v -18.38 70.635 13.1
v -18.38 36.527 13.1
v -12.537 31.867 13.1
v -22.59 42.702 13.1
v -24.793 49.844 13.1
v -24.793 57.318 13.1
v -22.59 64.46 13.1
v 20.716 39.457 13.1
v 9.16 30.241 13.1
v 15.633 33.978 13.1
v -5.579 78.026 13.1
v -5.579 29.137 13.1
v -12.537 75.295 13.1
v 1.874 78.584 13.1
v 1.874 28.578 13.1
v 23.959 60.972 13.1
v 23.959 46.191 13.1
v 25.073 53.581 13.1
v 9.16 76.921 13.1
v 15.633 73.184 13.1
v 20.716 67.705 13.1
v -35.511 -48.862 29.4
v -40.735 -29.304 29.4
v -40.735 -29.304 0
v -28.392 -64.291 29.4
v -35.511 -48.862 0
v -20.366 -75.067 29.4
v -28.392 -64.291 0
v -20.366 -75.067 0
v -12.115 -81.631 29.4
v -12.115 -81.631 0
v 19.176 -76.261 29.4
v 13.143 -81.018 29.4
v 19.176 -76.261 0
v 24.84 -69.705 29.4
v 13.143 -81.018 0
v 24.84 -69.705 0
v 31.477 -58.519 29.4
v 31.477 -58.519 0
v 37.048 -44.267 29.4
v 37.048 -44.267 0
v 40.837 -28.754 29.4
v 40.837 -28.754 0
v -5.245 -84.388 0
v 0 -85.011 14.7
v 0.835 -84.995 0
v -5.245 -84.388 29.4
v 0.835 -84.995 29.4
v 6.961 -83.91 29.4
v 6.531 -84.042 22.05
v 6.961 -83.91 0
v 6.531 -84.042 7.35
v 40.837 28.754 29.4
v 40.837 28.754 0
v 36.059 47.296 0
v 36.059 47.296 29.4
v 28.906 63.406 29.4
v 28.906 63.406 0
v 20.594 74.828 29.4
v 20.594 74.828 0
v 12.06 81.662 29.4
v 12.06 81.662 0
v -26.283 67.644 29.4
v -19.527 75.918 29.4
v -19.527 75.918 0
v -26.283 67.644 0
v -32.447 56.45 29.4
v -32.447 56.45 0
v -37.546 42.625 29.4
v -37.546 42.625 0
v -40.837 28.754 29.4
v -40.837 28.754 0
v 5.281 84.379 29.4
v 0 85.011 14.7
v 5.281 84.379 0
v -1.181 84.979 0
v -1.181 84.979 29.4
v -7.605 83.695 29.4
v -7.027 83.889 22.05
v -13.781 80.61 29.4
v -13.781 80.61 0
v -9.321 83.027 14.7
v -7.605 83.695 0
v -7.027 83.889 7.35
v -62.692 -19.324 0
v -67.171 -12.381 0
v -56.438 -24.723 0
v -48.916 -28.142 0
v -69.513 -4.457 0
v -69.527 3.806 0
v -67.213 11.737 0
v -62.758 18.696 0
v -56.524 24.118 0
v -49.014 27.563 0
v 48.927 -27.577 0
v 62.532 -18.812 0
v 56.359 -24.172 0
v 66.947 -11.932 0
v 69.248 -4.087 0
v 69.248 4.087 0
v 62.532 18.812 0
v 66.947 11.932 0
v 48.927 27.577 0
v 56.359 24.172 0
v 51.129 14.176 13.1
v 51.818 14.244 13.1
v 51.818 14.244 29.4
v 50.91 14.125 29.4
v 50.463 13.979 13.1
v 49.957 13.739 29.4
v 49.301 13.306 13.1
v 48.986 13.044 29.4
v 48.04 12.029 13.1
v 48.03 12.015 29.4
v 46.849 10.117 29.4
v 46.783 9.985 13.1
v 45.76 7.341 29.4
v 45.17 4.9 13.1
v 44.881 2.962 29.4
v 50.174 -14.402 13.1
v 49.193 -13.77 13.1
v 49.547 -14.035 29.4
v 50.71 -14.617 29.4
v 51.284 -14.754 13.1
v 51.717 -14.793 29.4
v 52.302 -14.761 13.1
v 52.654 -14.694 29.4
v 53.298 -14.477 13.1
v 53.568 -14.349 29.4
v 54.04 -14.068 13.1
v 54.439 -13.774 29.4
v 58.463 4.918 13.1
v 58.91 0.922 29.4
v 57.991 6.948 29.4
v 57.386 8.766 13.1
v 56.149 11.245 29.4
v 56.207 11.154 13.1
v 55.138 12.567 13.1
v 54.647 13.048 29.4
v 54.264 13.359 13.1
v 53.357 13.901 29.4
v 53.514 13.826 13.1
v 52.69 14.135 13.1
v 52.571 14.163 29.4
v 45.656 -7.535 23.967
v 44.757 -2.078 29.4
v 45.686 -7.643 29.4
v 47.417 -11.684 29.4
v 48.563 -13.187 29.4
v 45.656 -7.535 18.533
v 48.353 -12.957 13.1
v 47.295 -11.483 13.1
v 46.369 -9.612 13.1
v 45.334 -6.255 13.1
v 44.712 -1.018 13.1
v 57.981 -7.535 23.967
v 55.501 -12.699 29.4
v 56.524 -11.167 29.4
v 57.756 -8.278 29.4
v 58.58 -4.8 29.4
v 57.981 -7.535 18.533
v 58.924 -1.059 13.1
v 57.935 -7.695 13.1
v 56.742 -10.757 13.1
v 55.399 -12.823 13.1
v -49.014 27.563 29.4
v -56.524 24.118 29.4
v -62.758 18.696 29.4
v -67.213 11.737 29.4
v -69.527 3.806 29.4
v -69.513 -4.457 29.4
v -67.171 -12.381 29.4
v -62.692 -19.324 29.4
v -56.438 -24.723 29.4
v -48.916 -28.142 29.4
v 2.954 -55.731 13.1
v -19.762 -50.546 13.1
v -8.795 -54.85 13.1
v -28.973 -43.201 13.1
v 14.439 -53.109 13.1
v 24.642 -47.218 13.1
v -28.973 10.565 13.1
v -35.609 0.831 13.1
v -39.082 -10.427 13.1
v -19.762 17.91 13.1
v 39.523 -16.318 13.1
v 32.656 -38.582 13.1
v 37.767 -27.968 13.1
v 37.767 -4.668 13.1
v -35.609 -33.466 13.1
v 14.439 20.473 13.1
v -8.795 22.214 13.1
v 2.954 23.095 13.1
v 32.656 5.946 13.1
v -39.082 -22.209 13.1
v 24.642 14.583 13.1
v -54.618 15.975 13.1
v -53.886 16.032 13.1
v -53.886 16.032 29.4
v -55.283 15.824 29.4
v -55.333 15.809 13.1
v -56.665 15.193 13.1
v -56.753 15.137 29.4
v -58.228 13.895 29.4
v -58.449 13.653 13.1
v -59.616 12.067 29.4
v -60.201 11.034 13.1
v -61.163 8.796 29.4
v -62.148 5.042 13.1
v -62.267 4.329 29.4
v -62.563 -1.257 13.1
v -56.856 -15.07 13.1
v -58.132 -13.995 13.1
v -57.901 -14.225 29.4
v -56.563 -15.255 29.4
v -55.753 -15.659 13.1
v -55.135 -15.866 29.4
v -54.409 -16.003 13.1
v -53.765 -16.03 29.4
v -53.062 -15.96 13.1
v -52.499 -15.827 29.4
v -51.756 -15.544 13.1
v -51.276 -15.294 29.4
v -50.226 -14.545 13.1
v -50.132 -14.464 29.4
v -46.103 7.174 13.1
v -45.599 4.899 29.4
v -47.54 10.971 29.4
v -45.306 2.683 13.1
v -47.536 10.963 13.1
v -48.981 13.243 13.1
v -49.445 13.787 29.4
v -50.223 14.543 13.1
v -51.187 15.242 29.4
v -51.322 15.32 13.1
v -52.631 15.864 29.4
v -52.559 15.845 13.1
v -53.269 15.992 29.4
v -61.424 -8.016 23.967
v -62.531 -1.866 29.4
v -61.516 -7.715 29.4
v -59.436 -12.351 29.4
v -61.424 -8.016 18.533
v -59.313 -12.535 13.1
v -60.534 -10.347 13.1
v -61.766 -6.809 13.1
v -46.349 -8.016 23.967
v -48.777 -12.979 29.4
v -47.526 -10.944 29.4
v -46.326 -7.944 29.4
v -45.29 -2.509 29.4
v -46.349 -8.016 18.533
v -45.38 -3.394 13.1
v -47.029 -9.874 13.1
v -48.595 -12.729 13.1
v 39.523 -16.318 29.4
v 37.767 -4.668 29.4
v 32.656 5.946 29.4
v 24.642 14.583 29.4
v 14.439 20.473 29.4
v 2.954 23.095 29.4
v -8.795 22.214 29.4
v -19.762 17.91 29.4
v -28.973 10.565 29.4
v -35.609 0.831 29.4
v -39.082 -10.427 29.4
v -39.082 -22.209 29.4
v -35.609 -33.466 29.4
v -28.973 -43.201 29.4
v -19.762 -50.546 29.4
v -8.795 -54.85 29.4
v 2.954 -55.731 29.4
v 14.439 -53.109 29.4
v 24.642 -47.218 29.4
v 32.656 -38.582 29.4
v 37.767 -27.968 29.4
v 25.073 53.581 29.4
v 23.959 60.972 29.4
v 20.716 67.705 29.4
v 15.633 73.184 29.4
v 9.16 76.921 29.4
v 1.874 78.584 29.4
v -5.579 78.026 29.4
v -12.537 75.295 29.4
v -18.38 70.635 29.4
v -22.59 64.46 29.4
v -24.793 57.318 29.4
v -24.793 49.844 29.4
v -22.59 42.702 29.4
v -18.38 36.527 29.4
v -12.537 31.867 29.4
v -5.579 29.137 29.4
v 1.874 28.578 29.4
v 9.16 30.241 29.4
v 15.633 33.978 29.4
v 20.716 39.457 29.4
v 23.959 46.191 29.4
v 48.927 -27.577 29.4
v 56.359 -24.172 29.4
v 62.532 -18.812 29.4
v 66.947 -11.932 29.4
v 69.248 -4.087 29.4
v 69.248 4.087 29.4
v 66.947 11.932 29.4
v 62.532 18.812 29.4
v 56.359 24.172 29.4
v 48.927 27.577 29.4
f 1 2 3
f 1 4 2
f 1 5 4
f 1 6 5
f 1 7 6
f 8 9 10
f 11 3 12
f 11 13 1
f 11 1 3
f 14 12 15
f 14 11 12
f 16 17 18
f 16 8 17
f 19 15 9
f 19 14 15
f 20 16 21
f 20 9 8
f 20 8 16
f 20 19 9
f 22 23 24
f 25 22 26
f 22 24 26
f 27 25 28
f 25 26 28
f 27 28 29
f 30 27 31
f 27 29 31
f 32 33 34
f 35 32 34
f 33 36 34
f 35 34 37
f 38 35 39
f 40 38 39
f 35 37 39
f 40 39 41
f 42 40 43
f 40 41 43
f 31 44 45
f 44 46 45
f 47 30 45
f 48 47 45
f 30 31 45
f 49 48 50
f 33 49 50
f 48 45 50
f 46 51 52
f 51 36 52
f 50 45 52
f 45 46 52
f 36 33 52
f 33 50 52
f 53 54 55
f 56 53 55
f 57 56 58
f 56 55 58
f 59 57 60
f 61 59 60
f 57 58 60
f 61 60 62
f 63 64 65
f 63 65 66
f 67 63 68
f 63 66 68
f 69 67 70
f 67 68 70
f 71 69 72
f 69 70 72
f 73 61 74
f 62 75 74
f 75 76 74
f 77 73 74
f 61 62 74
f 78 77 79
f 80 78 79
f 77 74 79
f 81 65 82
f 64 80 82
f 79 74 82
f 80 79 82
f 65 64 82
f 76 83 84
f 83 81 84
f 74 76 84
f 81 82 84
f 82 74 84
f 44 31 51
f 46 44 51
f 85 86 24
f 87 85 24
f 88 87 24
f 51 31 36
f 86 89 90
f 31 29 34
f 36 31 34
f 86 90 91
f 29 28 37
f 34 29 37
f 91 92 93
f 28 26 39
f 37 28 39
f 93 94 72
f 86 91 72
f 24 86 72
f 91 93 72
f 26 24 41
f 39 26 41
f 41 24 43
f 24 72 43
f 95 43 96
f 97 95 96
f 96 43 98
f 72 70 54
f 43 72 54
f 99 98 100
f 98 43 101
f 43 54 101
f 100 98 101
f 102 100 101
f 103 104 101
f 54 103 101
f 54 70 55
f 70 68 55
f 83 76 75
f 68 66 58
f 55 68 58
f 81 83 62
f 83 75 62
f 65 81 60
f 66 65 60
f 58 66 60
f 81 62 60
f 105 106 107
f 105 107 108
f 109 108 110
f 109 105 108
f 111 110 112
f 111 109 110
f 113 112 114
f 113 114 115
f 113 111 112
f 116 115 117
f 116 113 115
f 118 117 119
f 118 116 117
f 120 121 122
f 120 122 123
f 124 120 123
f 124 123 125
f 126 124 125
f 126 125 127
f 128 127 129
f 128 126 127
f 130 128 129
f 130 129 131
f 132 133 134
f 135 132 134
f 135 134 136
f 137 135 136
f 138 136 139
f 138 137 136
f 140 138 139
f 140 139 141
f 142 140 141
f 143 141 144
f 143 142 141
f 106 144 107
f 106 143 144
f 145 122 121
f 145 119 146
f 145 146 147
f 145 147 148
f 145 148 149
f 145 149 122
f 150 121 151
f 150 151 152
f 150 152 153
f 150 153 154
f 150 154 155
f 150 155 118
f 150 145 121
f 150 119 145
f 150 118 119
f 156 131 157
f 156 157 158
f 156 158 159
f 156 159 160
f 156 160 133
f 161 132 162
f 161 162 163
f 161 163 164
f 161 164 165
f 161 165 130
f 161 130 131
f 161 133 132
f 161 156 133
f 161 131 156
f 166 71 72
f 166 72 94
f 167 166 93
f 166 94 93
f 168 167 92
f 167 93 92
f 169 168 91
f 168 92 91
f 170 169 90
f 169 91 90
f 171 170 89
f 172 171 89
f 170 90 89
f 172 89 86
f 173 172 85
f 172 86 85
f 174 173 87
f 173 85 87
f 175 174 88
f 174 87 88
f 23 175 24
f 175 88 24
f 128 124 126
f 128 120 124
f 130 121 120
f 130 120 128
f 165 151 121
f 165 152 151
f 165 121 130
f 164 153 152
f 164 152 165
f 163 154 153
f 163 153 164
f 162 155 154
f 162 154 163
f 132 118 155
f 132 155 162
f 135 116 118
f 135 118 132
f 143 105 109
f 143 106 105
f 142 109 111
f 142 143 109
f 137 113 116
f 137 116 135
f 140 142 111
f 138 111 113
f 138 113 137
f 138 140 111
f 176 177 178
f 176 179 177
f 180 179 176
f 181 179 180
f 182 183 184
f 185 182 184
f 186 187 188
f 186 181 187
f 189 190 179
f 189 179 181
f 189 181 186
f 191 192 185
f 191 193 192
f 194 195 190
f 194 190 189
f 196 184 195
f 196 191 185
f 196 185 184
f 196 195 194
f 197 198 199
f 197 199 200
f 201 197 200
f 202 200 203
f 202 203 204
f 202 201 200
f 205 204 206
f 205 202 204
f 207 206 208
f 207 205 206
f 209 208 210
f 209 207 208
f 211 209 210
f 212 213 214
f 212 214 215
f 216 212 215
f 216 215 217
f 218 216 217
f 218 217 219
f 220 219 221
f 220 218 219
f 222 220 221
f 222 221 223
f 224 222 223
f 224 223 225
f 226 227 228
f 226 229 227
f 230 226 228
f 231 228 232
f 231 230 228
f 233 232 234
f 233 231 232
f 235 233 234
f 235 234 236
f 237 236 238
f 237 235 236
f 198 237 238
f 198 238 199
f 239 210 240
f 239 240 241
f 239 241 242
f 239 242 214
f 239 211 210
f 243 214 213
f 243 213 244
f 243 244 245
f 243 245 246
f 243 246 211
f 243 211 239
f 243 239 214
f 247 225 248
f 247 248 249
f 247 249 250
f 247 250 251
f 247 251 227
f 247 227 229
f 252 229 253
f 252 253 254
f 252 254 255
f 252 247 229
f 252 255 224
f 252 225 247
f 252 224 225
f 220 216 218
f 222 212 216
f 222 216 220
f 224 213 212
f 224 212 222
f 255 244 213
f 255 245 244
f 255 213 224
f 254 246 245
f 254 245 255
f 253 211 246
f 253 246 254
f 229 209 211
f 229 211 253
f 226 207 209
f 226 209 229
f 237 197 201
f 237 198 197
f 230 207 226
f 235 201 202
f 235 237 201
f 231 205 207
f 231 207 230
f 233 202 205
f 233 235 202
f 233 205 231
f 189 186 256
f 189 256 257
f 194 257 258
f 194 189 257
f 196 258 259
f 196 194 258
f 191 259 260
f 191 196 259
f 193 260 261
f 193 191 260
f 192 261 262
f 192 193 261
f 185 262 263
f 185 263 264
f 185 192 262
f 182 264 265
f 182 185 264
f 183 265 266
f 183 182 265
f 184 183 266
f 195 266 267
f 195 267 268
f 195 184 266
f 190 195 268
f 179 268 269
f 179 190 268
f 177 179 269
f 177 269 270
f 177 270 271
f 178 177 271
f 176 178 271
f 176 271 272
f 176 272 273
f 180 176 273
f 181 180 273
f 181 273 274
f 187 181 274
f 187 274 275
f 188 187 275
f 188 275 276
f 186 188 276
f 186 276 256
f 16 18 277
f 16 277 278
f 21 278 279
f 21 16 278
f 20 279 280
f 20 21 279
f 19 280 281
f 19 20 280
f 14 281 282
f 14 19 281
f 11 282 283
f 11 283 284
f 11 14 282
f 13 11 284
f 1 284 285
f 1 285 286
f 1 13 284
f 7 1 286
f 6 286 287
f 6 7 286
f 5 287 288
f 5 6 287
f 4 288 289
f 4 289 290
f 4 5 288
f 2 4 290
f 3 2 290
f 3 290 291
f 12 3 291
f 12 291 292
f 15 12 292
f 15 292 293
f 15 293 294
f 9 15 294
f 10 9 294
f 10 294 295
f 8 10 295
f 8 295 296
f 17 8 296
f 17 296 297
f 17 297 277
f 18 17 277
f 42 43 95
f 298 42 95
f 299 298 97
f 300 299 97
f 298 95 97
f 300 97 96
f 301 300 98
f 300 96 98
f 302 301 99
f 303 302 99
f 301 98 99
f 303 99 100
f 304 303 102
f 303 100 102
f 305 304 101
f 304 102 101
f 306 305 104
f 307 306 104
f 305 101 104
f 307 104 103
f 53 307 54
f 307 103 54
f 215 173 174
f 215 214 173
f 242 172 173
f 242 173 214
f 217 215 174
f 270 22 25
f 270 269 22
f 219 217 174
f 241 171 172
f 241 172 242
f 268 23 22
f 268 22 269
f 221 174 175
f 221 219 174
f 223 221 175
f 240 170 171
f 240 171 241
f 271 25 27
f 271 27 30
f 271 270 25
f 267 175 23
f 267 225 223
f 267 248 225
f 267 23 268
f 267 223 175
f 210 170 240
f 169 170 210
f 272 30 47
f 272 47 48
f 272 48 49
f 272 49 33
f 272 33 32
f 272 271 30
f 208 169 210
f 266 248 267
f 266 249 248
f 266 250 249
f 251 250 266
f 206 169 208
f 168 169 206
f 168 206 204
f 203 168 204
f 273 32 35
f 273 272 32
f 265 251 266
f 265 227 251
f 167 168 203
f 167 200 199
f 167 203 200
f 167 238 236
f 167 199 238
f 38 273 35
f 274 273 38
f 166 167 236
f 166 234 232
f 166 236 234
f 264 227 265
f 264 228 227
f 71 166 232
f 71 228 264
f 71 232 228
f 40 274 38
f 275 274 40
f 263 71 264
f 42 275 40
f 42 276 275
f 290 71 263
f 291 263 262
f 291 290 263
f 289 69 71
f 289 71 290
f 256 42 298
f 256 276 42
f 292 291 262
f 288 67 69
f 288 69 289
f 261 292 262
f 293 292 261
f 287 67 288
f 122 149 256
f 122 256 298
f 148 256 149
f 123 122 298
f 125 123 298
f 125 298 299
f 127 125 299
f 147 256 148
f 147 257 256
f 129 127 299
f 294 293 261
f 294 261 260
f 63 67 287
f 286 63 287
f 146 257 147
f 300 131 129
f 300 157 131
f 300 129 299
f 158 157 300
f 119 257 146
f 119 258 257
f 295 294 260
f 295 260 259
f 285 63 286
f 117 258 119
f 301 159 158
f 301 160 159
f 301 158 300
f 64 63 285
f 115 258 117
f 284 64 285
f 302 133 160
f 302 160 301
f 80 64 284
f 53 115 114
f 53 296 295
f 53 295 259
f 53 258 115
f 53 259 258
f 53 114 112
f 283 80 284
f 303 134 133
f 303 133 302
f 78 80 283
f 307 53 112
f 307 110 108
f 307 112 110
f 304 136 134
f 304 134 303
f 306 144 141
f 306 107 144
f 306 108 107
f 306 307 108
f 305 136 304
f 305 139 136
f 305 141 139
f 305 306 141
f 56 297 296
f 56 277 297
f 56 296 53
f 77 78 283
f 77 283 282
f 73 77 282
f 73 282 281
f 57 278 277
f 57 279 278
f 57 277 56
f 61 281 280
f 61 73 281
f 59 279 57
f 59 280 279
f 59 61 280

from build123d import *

# Parameters (mm, degrees)
F0_R     = 39.52332
F0_R_2   = 25.073215
F1_DEPTH = 29.4
F2_DEPTH = 13.1


with BuildPart() as f1:
    # F0 (on Top) → F1 (new body)
    with BuildSketch(Plane.XY):
        with BuildLine():
            add(Edge.make_bspline(
                [(-40.837481, 28.753623), (-46.170077, -0.311493), (-40.735415, -29.303966)],
                knots=[4.367348, 4.367348, 4.367348, 5.064317, 5.064317, 5.064317], degree=2, weights=[1, 0.939891, 1]))
            add(Edge.make_bspline(
                [(-40.735415, -29.303966), (-30.293118, -85.010841), (0, -85.010841)],
                knots=[5.064317, 5.064317, 5.064317, 6.283185, 6.283185, 6.283185], degree=2, weights=[1, 0.819972, 1]))
            add(Edge.make_bspline(
                [(0, -85.010841), (30.515932, -85.010841), (40.837481, -28.753623)],
                knots=[0, 0, 0, 1.225756, 1.225756, 1.225756], degree=2, weights=[1, 0.817996, 1]))
            add(Edge.make_bspline(
                [(40.837481, -28.753623), (46.112927, 0), (40.837481, 28.753623)],
                knots=[1.225756, 1.225756, 1.225756, 1.915837, 1.915837, 1.915837], degree=2, weights=[1, 0.941062, 1]))
            add(Edge.make_bspline(
                [(40.837481, 28.753623), (0, 251.336785), (-40.837481, 28.753623)],
                knots=[1.915837, 1.915837, 1.915837, 4.367348, 4.367348, 4.367348], degree=2, weights=[1, 0.338235, 1]))
        make_face()
        with Locations((0, -16.317906)):
            Circle(F0_R, mode=Mode.SUBTRACT)
        with Locations((0, 53.581182)):
            Circle(F0_R_2, mode=Mode.SUBTRACT)
        with BuildLine():
            ThreePointArc((-40.837481, 28.753623), (-69.815247, -0.326204), (-40.735415, -29.303966))
            add(Edge.make_bspline(
                [(-40.837481, 28.753623), (-46.170077, -0.311493), (-40.735415, -29.303966)],
                knots=[4.367348, 4.367348, 4.367348, 5.064317, 5.064317, 5.064317], degree=2, weights=[1, 0.939891, 1]))
        make_face()
        with BuildLine():
            add(Edge.make_bspline(
                [(-53.886287, 16.032058), (-68.961304, 16.032058), (-61.423796, -8.016029), (-53.886287, -32.064117), (-46.348778, -8.016029), (-38.811269, 16.032058), (-53.886287, 16.032058)],
                knots=[0, 0, 0, 2.094395, 2.094395, 4.18879, 4.18879, 6.283185, 6.283185, 6.283185], degree=2, weights=[1, 0.5, 1, 0.5, 1, 0.5, 1]))
        make_face(mode=Mode.SUBTRACT)
        with BuildLine():
            add(Edge.make_bspline(
                [(40.837481, -28.753623), (46.112927, 0), (40.837481, 28.753623)],
                knots=[1.225756, 1.225756, 1.225756, 1.915837, 1.915837, 1.915837], degree=2, weights=[1, 0.941062, 1]))
            ThreePointArc((40.837481, -28.753623), (69.540121, 0), (40.837481, 28.753623))
        make_face()
        with BuildLine():
            add(Edge.make_bspline(
                [(51.818211, 14.244223), (39.493133, 14.244223), (45.655672, -7.534868), (51.818211, -29.31396), (57.98075, -7.534868), (64.143288, 14.244223), (51.818211, 14.244223)],
                knots=[0, 0, 0, 2.094395, 2.094395, 4.18879, 4.18879, 6.283185, 6.283185, 6.283185], degree=2, weights=[1, 0.5, 1, 0.5, 1, 0.5, 1]))
        make_face(mode=Mode.SUBTRACT)
    extrude(amount=F1_DEPTH)

    # F0 (on Top) → F2 (join)
    with BuildSketch(Plane.XY):
        with BuildLine():
            add(Edge.make_bspline(
                [(-40.837481, 28.753623), (-46.170077, -0.311493), (-40.735415, -29.303966)],
                knots=[4.367348, 4.367348, 4.367348, 5.064317, 5.064317, 5.064317], degree=2, weights=[1, 0.939891, 1]))
            add(Edge.make_bspline(
                [(-40.735415, -29.303966), (-30.293118, -85.010841), (0, -85.010841)],
                knots=[5.064317, 5.064317, 5.064317, 6.283185, 6.283185, 6.283185], degree=2, weights=[1, 0.819972, 1]))
            add(Edge.make_bspline(
                [(0, -85.010841), (30.515932, -85.010841), (40.837481, -28.753623)],
                knots=[0, 0, 0, 1.225756, 1.225756, 1.225756], degree=2, weights=[1, 0.817996, 1]))
            add(Edge.make_bspline(
                [(40.837481, -28.753623), (46.112927, 0), (40.837481, 28.753623)],
                knots=[1.225756, 1.225756, 1.225756, 1.915837, 1.915837, 1.915837], degree=2, weights=[1, 0.941062, 1]))
            add(Edge.make_bspline(
                [(40.837481, 28.753623), (0, 251.336785), (-40.837481, 28.753623)],
                knots=[1.915837, 1.915837, 1.915837, 4.367348, 4.367348, 4.367348], degree=2, weights=[1, 0.338235, 1]))
        make_face()
        with Locations((0, -16.317906)):
            Circle(F0_R, mode=Mode.SUBTRACT)
        with Locations((0, 53.581182)):
            Circle(F0_R_2, mode=Mode.SUBTRACT)
        with BuildLine():
            ThreePointArc((-40.837481, 28.753623), (-69.815247, -0.326204), (-40.735415, -29.303966))
            add(Edge.make_bspline(
                [(-40.837481, 28.753623), (-46.170077, -0.311493), (-40.735415, -29.303966)],
                knots=[4.367348, 4.367348, 4.367348, 5.064317, 5.064317, 5.064317], degree=2, weights=[1, 0.939891, 1]))
        make_face()
        with BuildLine():
            add(Edge.make_bspline(
                [(-53.886287, 16.032058), (-68.961304, 16.032058), (-61.423796, -8.016029), (-53.886287, -32.064117), (-46.348778, -8.016029), (-38.811269, 16.032058), (-53.886287, 16.032058)],
                knots=[0, 0, 0, 2.094395, 2.094395, 4.18879, 4.18879, 6.283185, 6.283185, 6.283185], degree=2, weights=[1, 0.5, 1, 0.5, 1, 0.5, 1]))
        make_face(mode=Mode.SUBTRACT)
        with BuildLine():
            add(Edge.make_bspline(
                [(40.837481, -28.753623), (46.112927, 0), (40.837481, 28.753623)],
                knots=[1.225756, 1.225756, 1.225756, 1.915837, 1.915837, 1.915837], degree=2, weights=[1, 0.941062, 1]))
            ThreePointArc((40.837481, -28.753623), (69.540121, 0), (40.837481, 28.753623))
        make_face()
        with BuildLine():
            add(Edge.make_bspline(
                [(51.818211, 14.244223), (39.493133, 14.244223), (45.655672, -7.534868), (51.818211, -29.31396), (57.98075, -7.534868), (64.143288, 14.244223), (51.818211, 14.244223)],
                knots=[0, 0, 0, 2.094395, 2.094395, 4.18879, 4.18879, 6.283185, 6.283185, 6.283185], degree=2, weights=[1, 0.5, 1, 0.5, 1, 0.5, 1]))
        make_face(mode=Mode.SUBTRACT)
        with BuildLine():
            add(Edge.make_bspline(
                [(51.818211, 14.244223), (39.493133, 14.244223), (45.655672, -7.534868), (51.818211, -29.31396), (57.98075, -7.534868), (64.143288, 14.244223), (51.818211, 14.244223)],
                knots=[0, 0, 0, 2.094395, 2.094395, 4.18879, 4.18879, 6.283185, 6.283185, 6.283185], degree=2, weights=[1, 0.5, 1, 0.5, 1, 0.5, 1]))
        make_face()
        with Locations((0, -16.317906)):
            Circle(F0_R)
        with Locations((0, 53.581182)):
            Circle(F0_R_2)
        with BuildLine():
            add(Edge.make_bspline(
                [(-53.886287, 16.032058), (-68.961304, 16.032058), (-61.423796, -8.016029), (-53.886287, -32.064117), (-46.348778, -8.016029), (-38.811269, 16.032058), (-53.886287, 16.032058)],
                knots=[0, 0, 0, 2.094395, 2.094395, 4.18879, 4.18879, 6.283185, 6.283185, 6.283185], degree=2, weights=[1, 0.5, 1, 0.5, 1, 0.5, 1]))
        make_face()
    extrude(amount=F2_DEPTH)


solid = f1.part
